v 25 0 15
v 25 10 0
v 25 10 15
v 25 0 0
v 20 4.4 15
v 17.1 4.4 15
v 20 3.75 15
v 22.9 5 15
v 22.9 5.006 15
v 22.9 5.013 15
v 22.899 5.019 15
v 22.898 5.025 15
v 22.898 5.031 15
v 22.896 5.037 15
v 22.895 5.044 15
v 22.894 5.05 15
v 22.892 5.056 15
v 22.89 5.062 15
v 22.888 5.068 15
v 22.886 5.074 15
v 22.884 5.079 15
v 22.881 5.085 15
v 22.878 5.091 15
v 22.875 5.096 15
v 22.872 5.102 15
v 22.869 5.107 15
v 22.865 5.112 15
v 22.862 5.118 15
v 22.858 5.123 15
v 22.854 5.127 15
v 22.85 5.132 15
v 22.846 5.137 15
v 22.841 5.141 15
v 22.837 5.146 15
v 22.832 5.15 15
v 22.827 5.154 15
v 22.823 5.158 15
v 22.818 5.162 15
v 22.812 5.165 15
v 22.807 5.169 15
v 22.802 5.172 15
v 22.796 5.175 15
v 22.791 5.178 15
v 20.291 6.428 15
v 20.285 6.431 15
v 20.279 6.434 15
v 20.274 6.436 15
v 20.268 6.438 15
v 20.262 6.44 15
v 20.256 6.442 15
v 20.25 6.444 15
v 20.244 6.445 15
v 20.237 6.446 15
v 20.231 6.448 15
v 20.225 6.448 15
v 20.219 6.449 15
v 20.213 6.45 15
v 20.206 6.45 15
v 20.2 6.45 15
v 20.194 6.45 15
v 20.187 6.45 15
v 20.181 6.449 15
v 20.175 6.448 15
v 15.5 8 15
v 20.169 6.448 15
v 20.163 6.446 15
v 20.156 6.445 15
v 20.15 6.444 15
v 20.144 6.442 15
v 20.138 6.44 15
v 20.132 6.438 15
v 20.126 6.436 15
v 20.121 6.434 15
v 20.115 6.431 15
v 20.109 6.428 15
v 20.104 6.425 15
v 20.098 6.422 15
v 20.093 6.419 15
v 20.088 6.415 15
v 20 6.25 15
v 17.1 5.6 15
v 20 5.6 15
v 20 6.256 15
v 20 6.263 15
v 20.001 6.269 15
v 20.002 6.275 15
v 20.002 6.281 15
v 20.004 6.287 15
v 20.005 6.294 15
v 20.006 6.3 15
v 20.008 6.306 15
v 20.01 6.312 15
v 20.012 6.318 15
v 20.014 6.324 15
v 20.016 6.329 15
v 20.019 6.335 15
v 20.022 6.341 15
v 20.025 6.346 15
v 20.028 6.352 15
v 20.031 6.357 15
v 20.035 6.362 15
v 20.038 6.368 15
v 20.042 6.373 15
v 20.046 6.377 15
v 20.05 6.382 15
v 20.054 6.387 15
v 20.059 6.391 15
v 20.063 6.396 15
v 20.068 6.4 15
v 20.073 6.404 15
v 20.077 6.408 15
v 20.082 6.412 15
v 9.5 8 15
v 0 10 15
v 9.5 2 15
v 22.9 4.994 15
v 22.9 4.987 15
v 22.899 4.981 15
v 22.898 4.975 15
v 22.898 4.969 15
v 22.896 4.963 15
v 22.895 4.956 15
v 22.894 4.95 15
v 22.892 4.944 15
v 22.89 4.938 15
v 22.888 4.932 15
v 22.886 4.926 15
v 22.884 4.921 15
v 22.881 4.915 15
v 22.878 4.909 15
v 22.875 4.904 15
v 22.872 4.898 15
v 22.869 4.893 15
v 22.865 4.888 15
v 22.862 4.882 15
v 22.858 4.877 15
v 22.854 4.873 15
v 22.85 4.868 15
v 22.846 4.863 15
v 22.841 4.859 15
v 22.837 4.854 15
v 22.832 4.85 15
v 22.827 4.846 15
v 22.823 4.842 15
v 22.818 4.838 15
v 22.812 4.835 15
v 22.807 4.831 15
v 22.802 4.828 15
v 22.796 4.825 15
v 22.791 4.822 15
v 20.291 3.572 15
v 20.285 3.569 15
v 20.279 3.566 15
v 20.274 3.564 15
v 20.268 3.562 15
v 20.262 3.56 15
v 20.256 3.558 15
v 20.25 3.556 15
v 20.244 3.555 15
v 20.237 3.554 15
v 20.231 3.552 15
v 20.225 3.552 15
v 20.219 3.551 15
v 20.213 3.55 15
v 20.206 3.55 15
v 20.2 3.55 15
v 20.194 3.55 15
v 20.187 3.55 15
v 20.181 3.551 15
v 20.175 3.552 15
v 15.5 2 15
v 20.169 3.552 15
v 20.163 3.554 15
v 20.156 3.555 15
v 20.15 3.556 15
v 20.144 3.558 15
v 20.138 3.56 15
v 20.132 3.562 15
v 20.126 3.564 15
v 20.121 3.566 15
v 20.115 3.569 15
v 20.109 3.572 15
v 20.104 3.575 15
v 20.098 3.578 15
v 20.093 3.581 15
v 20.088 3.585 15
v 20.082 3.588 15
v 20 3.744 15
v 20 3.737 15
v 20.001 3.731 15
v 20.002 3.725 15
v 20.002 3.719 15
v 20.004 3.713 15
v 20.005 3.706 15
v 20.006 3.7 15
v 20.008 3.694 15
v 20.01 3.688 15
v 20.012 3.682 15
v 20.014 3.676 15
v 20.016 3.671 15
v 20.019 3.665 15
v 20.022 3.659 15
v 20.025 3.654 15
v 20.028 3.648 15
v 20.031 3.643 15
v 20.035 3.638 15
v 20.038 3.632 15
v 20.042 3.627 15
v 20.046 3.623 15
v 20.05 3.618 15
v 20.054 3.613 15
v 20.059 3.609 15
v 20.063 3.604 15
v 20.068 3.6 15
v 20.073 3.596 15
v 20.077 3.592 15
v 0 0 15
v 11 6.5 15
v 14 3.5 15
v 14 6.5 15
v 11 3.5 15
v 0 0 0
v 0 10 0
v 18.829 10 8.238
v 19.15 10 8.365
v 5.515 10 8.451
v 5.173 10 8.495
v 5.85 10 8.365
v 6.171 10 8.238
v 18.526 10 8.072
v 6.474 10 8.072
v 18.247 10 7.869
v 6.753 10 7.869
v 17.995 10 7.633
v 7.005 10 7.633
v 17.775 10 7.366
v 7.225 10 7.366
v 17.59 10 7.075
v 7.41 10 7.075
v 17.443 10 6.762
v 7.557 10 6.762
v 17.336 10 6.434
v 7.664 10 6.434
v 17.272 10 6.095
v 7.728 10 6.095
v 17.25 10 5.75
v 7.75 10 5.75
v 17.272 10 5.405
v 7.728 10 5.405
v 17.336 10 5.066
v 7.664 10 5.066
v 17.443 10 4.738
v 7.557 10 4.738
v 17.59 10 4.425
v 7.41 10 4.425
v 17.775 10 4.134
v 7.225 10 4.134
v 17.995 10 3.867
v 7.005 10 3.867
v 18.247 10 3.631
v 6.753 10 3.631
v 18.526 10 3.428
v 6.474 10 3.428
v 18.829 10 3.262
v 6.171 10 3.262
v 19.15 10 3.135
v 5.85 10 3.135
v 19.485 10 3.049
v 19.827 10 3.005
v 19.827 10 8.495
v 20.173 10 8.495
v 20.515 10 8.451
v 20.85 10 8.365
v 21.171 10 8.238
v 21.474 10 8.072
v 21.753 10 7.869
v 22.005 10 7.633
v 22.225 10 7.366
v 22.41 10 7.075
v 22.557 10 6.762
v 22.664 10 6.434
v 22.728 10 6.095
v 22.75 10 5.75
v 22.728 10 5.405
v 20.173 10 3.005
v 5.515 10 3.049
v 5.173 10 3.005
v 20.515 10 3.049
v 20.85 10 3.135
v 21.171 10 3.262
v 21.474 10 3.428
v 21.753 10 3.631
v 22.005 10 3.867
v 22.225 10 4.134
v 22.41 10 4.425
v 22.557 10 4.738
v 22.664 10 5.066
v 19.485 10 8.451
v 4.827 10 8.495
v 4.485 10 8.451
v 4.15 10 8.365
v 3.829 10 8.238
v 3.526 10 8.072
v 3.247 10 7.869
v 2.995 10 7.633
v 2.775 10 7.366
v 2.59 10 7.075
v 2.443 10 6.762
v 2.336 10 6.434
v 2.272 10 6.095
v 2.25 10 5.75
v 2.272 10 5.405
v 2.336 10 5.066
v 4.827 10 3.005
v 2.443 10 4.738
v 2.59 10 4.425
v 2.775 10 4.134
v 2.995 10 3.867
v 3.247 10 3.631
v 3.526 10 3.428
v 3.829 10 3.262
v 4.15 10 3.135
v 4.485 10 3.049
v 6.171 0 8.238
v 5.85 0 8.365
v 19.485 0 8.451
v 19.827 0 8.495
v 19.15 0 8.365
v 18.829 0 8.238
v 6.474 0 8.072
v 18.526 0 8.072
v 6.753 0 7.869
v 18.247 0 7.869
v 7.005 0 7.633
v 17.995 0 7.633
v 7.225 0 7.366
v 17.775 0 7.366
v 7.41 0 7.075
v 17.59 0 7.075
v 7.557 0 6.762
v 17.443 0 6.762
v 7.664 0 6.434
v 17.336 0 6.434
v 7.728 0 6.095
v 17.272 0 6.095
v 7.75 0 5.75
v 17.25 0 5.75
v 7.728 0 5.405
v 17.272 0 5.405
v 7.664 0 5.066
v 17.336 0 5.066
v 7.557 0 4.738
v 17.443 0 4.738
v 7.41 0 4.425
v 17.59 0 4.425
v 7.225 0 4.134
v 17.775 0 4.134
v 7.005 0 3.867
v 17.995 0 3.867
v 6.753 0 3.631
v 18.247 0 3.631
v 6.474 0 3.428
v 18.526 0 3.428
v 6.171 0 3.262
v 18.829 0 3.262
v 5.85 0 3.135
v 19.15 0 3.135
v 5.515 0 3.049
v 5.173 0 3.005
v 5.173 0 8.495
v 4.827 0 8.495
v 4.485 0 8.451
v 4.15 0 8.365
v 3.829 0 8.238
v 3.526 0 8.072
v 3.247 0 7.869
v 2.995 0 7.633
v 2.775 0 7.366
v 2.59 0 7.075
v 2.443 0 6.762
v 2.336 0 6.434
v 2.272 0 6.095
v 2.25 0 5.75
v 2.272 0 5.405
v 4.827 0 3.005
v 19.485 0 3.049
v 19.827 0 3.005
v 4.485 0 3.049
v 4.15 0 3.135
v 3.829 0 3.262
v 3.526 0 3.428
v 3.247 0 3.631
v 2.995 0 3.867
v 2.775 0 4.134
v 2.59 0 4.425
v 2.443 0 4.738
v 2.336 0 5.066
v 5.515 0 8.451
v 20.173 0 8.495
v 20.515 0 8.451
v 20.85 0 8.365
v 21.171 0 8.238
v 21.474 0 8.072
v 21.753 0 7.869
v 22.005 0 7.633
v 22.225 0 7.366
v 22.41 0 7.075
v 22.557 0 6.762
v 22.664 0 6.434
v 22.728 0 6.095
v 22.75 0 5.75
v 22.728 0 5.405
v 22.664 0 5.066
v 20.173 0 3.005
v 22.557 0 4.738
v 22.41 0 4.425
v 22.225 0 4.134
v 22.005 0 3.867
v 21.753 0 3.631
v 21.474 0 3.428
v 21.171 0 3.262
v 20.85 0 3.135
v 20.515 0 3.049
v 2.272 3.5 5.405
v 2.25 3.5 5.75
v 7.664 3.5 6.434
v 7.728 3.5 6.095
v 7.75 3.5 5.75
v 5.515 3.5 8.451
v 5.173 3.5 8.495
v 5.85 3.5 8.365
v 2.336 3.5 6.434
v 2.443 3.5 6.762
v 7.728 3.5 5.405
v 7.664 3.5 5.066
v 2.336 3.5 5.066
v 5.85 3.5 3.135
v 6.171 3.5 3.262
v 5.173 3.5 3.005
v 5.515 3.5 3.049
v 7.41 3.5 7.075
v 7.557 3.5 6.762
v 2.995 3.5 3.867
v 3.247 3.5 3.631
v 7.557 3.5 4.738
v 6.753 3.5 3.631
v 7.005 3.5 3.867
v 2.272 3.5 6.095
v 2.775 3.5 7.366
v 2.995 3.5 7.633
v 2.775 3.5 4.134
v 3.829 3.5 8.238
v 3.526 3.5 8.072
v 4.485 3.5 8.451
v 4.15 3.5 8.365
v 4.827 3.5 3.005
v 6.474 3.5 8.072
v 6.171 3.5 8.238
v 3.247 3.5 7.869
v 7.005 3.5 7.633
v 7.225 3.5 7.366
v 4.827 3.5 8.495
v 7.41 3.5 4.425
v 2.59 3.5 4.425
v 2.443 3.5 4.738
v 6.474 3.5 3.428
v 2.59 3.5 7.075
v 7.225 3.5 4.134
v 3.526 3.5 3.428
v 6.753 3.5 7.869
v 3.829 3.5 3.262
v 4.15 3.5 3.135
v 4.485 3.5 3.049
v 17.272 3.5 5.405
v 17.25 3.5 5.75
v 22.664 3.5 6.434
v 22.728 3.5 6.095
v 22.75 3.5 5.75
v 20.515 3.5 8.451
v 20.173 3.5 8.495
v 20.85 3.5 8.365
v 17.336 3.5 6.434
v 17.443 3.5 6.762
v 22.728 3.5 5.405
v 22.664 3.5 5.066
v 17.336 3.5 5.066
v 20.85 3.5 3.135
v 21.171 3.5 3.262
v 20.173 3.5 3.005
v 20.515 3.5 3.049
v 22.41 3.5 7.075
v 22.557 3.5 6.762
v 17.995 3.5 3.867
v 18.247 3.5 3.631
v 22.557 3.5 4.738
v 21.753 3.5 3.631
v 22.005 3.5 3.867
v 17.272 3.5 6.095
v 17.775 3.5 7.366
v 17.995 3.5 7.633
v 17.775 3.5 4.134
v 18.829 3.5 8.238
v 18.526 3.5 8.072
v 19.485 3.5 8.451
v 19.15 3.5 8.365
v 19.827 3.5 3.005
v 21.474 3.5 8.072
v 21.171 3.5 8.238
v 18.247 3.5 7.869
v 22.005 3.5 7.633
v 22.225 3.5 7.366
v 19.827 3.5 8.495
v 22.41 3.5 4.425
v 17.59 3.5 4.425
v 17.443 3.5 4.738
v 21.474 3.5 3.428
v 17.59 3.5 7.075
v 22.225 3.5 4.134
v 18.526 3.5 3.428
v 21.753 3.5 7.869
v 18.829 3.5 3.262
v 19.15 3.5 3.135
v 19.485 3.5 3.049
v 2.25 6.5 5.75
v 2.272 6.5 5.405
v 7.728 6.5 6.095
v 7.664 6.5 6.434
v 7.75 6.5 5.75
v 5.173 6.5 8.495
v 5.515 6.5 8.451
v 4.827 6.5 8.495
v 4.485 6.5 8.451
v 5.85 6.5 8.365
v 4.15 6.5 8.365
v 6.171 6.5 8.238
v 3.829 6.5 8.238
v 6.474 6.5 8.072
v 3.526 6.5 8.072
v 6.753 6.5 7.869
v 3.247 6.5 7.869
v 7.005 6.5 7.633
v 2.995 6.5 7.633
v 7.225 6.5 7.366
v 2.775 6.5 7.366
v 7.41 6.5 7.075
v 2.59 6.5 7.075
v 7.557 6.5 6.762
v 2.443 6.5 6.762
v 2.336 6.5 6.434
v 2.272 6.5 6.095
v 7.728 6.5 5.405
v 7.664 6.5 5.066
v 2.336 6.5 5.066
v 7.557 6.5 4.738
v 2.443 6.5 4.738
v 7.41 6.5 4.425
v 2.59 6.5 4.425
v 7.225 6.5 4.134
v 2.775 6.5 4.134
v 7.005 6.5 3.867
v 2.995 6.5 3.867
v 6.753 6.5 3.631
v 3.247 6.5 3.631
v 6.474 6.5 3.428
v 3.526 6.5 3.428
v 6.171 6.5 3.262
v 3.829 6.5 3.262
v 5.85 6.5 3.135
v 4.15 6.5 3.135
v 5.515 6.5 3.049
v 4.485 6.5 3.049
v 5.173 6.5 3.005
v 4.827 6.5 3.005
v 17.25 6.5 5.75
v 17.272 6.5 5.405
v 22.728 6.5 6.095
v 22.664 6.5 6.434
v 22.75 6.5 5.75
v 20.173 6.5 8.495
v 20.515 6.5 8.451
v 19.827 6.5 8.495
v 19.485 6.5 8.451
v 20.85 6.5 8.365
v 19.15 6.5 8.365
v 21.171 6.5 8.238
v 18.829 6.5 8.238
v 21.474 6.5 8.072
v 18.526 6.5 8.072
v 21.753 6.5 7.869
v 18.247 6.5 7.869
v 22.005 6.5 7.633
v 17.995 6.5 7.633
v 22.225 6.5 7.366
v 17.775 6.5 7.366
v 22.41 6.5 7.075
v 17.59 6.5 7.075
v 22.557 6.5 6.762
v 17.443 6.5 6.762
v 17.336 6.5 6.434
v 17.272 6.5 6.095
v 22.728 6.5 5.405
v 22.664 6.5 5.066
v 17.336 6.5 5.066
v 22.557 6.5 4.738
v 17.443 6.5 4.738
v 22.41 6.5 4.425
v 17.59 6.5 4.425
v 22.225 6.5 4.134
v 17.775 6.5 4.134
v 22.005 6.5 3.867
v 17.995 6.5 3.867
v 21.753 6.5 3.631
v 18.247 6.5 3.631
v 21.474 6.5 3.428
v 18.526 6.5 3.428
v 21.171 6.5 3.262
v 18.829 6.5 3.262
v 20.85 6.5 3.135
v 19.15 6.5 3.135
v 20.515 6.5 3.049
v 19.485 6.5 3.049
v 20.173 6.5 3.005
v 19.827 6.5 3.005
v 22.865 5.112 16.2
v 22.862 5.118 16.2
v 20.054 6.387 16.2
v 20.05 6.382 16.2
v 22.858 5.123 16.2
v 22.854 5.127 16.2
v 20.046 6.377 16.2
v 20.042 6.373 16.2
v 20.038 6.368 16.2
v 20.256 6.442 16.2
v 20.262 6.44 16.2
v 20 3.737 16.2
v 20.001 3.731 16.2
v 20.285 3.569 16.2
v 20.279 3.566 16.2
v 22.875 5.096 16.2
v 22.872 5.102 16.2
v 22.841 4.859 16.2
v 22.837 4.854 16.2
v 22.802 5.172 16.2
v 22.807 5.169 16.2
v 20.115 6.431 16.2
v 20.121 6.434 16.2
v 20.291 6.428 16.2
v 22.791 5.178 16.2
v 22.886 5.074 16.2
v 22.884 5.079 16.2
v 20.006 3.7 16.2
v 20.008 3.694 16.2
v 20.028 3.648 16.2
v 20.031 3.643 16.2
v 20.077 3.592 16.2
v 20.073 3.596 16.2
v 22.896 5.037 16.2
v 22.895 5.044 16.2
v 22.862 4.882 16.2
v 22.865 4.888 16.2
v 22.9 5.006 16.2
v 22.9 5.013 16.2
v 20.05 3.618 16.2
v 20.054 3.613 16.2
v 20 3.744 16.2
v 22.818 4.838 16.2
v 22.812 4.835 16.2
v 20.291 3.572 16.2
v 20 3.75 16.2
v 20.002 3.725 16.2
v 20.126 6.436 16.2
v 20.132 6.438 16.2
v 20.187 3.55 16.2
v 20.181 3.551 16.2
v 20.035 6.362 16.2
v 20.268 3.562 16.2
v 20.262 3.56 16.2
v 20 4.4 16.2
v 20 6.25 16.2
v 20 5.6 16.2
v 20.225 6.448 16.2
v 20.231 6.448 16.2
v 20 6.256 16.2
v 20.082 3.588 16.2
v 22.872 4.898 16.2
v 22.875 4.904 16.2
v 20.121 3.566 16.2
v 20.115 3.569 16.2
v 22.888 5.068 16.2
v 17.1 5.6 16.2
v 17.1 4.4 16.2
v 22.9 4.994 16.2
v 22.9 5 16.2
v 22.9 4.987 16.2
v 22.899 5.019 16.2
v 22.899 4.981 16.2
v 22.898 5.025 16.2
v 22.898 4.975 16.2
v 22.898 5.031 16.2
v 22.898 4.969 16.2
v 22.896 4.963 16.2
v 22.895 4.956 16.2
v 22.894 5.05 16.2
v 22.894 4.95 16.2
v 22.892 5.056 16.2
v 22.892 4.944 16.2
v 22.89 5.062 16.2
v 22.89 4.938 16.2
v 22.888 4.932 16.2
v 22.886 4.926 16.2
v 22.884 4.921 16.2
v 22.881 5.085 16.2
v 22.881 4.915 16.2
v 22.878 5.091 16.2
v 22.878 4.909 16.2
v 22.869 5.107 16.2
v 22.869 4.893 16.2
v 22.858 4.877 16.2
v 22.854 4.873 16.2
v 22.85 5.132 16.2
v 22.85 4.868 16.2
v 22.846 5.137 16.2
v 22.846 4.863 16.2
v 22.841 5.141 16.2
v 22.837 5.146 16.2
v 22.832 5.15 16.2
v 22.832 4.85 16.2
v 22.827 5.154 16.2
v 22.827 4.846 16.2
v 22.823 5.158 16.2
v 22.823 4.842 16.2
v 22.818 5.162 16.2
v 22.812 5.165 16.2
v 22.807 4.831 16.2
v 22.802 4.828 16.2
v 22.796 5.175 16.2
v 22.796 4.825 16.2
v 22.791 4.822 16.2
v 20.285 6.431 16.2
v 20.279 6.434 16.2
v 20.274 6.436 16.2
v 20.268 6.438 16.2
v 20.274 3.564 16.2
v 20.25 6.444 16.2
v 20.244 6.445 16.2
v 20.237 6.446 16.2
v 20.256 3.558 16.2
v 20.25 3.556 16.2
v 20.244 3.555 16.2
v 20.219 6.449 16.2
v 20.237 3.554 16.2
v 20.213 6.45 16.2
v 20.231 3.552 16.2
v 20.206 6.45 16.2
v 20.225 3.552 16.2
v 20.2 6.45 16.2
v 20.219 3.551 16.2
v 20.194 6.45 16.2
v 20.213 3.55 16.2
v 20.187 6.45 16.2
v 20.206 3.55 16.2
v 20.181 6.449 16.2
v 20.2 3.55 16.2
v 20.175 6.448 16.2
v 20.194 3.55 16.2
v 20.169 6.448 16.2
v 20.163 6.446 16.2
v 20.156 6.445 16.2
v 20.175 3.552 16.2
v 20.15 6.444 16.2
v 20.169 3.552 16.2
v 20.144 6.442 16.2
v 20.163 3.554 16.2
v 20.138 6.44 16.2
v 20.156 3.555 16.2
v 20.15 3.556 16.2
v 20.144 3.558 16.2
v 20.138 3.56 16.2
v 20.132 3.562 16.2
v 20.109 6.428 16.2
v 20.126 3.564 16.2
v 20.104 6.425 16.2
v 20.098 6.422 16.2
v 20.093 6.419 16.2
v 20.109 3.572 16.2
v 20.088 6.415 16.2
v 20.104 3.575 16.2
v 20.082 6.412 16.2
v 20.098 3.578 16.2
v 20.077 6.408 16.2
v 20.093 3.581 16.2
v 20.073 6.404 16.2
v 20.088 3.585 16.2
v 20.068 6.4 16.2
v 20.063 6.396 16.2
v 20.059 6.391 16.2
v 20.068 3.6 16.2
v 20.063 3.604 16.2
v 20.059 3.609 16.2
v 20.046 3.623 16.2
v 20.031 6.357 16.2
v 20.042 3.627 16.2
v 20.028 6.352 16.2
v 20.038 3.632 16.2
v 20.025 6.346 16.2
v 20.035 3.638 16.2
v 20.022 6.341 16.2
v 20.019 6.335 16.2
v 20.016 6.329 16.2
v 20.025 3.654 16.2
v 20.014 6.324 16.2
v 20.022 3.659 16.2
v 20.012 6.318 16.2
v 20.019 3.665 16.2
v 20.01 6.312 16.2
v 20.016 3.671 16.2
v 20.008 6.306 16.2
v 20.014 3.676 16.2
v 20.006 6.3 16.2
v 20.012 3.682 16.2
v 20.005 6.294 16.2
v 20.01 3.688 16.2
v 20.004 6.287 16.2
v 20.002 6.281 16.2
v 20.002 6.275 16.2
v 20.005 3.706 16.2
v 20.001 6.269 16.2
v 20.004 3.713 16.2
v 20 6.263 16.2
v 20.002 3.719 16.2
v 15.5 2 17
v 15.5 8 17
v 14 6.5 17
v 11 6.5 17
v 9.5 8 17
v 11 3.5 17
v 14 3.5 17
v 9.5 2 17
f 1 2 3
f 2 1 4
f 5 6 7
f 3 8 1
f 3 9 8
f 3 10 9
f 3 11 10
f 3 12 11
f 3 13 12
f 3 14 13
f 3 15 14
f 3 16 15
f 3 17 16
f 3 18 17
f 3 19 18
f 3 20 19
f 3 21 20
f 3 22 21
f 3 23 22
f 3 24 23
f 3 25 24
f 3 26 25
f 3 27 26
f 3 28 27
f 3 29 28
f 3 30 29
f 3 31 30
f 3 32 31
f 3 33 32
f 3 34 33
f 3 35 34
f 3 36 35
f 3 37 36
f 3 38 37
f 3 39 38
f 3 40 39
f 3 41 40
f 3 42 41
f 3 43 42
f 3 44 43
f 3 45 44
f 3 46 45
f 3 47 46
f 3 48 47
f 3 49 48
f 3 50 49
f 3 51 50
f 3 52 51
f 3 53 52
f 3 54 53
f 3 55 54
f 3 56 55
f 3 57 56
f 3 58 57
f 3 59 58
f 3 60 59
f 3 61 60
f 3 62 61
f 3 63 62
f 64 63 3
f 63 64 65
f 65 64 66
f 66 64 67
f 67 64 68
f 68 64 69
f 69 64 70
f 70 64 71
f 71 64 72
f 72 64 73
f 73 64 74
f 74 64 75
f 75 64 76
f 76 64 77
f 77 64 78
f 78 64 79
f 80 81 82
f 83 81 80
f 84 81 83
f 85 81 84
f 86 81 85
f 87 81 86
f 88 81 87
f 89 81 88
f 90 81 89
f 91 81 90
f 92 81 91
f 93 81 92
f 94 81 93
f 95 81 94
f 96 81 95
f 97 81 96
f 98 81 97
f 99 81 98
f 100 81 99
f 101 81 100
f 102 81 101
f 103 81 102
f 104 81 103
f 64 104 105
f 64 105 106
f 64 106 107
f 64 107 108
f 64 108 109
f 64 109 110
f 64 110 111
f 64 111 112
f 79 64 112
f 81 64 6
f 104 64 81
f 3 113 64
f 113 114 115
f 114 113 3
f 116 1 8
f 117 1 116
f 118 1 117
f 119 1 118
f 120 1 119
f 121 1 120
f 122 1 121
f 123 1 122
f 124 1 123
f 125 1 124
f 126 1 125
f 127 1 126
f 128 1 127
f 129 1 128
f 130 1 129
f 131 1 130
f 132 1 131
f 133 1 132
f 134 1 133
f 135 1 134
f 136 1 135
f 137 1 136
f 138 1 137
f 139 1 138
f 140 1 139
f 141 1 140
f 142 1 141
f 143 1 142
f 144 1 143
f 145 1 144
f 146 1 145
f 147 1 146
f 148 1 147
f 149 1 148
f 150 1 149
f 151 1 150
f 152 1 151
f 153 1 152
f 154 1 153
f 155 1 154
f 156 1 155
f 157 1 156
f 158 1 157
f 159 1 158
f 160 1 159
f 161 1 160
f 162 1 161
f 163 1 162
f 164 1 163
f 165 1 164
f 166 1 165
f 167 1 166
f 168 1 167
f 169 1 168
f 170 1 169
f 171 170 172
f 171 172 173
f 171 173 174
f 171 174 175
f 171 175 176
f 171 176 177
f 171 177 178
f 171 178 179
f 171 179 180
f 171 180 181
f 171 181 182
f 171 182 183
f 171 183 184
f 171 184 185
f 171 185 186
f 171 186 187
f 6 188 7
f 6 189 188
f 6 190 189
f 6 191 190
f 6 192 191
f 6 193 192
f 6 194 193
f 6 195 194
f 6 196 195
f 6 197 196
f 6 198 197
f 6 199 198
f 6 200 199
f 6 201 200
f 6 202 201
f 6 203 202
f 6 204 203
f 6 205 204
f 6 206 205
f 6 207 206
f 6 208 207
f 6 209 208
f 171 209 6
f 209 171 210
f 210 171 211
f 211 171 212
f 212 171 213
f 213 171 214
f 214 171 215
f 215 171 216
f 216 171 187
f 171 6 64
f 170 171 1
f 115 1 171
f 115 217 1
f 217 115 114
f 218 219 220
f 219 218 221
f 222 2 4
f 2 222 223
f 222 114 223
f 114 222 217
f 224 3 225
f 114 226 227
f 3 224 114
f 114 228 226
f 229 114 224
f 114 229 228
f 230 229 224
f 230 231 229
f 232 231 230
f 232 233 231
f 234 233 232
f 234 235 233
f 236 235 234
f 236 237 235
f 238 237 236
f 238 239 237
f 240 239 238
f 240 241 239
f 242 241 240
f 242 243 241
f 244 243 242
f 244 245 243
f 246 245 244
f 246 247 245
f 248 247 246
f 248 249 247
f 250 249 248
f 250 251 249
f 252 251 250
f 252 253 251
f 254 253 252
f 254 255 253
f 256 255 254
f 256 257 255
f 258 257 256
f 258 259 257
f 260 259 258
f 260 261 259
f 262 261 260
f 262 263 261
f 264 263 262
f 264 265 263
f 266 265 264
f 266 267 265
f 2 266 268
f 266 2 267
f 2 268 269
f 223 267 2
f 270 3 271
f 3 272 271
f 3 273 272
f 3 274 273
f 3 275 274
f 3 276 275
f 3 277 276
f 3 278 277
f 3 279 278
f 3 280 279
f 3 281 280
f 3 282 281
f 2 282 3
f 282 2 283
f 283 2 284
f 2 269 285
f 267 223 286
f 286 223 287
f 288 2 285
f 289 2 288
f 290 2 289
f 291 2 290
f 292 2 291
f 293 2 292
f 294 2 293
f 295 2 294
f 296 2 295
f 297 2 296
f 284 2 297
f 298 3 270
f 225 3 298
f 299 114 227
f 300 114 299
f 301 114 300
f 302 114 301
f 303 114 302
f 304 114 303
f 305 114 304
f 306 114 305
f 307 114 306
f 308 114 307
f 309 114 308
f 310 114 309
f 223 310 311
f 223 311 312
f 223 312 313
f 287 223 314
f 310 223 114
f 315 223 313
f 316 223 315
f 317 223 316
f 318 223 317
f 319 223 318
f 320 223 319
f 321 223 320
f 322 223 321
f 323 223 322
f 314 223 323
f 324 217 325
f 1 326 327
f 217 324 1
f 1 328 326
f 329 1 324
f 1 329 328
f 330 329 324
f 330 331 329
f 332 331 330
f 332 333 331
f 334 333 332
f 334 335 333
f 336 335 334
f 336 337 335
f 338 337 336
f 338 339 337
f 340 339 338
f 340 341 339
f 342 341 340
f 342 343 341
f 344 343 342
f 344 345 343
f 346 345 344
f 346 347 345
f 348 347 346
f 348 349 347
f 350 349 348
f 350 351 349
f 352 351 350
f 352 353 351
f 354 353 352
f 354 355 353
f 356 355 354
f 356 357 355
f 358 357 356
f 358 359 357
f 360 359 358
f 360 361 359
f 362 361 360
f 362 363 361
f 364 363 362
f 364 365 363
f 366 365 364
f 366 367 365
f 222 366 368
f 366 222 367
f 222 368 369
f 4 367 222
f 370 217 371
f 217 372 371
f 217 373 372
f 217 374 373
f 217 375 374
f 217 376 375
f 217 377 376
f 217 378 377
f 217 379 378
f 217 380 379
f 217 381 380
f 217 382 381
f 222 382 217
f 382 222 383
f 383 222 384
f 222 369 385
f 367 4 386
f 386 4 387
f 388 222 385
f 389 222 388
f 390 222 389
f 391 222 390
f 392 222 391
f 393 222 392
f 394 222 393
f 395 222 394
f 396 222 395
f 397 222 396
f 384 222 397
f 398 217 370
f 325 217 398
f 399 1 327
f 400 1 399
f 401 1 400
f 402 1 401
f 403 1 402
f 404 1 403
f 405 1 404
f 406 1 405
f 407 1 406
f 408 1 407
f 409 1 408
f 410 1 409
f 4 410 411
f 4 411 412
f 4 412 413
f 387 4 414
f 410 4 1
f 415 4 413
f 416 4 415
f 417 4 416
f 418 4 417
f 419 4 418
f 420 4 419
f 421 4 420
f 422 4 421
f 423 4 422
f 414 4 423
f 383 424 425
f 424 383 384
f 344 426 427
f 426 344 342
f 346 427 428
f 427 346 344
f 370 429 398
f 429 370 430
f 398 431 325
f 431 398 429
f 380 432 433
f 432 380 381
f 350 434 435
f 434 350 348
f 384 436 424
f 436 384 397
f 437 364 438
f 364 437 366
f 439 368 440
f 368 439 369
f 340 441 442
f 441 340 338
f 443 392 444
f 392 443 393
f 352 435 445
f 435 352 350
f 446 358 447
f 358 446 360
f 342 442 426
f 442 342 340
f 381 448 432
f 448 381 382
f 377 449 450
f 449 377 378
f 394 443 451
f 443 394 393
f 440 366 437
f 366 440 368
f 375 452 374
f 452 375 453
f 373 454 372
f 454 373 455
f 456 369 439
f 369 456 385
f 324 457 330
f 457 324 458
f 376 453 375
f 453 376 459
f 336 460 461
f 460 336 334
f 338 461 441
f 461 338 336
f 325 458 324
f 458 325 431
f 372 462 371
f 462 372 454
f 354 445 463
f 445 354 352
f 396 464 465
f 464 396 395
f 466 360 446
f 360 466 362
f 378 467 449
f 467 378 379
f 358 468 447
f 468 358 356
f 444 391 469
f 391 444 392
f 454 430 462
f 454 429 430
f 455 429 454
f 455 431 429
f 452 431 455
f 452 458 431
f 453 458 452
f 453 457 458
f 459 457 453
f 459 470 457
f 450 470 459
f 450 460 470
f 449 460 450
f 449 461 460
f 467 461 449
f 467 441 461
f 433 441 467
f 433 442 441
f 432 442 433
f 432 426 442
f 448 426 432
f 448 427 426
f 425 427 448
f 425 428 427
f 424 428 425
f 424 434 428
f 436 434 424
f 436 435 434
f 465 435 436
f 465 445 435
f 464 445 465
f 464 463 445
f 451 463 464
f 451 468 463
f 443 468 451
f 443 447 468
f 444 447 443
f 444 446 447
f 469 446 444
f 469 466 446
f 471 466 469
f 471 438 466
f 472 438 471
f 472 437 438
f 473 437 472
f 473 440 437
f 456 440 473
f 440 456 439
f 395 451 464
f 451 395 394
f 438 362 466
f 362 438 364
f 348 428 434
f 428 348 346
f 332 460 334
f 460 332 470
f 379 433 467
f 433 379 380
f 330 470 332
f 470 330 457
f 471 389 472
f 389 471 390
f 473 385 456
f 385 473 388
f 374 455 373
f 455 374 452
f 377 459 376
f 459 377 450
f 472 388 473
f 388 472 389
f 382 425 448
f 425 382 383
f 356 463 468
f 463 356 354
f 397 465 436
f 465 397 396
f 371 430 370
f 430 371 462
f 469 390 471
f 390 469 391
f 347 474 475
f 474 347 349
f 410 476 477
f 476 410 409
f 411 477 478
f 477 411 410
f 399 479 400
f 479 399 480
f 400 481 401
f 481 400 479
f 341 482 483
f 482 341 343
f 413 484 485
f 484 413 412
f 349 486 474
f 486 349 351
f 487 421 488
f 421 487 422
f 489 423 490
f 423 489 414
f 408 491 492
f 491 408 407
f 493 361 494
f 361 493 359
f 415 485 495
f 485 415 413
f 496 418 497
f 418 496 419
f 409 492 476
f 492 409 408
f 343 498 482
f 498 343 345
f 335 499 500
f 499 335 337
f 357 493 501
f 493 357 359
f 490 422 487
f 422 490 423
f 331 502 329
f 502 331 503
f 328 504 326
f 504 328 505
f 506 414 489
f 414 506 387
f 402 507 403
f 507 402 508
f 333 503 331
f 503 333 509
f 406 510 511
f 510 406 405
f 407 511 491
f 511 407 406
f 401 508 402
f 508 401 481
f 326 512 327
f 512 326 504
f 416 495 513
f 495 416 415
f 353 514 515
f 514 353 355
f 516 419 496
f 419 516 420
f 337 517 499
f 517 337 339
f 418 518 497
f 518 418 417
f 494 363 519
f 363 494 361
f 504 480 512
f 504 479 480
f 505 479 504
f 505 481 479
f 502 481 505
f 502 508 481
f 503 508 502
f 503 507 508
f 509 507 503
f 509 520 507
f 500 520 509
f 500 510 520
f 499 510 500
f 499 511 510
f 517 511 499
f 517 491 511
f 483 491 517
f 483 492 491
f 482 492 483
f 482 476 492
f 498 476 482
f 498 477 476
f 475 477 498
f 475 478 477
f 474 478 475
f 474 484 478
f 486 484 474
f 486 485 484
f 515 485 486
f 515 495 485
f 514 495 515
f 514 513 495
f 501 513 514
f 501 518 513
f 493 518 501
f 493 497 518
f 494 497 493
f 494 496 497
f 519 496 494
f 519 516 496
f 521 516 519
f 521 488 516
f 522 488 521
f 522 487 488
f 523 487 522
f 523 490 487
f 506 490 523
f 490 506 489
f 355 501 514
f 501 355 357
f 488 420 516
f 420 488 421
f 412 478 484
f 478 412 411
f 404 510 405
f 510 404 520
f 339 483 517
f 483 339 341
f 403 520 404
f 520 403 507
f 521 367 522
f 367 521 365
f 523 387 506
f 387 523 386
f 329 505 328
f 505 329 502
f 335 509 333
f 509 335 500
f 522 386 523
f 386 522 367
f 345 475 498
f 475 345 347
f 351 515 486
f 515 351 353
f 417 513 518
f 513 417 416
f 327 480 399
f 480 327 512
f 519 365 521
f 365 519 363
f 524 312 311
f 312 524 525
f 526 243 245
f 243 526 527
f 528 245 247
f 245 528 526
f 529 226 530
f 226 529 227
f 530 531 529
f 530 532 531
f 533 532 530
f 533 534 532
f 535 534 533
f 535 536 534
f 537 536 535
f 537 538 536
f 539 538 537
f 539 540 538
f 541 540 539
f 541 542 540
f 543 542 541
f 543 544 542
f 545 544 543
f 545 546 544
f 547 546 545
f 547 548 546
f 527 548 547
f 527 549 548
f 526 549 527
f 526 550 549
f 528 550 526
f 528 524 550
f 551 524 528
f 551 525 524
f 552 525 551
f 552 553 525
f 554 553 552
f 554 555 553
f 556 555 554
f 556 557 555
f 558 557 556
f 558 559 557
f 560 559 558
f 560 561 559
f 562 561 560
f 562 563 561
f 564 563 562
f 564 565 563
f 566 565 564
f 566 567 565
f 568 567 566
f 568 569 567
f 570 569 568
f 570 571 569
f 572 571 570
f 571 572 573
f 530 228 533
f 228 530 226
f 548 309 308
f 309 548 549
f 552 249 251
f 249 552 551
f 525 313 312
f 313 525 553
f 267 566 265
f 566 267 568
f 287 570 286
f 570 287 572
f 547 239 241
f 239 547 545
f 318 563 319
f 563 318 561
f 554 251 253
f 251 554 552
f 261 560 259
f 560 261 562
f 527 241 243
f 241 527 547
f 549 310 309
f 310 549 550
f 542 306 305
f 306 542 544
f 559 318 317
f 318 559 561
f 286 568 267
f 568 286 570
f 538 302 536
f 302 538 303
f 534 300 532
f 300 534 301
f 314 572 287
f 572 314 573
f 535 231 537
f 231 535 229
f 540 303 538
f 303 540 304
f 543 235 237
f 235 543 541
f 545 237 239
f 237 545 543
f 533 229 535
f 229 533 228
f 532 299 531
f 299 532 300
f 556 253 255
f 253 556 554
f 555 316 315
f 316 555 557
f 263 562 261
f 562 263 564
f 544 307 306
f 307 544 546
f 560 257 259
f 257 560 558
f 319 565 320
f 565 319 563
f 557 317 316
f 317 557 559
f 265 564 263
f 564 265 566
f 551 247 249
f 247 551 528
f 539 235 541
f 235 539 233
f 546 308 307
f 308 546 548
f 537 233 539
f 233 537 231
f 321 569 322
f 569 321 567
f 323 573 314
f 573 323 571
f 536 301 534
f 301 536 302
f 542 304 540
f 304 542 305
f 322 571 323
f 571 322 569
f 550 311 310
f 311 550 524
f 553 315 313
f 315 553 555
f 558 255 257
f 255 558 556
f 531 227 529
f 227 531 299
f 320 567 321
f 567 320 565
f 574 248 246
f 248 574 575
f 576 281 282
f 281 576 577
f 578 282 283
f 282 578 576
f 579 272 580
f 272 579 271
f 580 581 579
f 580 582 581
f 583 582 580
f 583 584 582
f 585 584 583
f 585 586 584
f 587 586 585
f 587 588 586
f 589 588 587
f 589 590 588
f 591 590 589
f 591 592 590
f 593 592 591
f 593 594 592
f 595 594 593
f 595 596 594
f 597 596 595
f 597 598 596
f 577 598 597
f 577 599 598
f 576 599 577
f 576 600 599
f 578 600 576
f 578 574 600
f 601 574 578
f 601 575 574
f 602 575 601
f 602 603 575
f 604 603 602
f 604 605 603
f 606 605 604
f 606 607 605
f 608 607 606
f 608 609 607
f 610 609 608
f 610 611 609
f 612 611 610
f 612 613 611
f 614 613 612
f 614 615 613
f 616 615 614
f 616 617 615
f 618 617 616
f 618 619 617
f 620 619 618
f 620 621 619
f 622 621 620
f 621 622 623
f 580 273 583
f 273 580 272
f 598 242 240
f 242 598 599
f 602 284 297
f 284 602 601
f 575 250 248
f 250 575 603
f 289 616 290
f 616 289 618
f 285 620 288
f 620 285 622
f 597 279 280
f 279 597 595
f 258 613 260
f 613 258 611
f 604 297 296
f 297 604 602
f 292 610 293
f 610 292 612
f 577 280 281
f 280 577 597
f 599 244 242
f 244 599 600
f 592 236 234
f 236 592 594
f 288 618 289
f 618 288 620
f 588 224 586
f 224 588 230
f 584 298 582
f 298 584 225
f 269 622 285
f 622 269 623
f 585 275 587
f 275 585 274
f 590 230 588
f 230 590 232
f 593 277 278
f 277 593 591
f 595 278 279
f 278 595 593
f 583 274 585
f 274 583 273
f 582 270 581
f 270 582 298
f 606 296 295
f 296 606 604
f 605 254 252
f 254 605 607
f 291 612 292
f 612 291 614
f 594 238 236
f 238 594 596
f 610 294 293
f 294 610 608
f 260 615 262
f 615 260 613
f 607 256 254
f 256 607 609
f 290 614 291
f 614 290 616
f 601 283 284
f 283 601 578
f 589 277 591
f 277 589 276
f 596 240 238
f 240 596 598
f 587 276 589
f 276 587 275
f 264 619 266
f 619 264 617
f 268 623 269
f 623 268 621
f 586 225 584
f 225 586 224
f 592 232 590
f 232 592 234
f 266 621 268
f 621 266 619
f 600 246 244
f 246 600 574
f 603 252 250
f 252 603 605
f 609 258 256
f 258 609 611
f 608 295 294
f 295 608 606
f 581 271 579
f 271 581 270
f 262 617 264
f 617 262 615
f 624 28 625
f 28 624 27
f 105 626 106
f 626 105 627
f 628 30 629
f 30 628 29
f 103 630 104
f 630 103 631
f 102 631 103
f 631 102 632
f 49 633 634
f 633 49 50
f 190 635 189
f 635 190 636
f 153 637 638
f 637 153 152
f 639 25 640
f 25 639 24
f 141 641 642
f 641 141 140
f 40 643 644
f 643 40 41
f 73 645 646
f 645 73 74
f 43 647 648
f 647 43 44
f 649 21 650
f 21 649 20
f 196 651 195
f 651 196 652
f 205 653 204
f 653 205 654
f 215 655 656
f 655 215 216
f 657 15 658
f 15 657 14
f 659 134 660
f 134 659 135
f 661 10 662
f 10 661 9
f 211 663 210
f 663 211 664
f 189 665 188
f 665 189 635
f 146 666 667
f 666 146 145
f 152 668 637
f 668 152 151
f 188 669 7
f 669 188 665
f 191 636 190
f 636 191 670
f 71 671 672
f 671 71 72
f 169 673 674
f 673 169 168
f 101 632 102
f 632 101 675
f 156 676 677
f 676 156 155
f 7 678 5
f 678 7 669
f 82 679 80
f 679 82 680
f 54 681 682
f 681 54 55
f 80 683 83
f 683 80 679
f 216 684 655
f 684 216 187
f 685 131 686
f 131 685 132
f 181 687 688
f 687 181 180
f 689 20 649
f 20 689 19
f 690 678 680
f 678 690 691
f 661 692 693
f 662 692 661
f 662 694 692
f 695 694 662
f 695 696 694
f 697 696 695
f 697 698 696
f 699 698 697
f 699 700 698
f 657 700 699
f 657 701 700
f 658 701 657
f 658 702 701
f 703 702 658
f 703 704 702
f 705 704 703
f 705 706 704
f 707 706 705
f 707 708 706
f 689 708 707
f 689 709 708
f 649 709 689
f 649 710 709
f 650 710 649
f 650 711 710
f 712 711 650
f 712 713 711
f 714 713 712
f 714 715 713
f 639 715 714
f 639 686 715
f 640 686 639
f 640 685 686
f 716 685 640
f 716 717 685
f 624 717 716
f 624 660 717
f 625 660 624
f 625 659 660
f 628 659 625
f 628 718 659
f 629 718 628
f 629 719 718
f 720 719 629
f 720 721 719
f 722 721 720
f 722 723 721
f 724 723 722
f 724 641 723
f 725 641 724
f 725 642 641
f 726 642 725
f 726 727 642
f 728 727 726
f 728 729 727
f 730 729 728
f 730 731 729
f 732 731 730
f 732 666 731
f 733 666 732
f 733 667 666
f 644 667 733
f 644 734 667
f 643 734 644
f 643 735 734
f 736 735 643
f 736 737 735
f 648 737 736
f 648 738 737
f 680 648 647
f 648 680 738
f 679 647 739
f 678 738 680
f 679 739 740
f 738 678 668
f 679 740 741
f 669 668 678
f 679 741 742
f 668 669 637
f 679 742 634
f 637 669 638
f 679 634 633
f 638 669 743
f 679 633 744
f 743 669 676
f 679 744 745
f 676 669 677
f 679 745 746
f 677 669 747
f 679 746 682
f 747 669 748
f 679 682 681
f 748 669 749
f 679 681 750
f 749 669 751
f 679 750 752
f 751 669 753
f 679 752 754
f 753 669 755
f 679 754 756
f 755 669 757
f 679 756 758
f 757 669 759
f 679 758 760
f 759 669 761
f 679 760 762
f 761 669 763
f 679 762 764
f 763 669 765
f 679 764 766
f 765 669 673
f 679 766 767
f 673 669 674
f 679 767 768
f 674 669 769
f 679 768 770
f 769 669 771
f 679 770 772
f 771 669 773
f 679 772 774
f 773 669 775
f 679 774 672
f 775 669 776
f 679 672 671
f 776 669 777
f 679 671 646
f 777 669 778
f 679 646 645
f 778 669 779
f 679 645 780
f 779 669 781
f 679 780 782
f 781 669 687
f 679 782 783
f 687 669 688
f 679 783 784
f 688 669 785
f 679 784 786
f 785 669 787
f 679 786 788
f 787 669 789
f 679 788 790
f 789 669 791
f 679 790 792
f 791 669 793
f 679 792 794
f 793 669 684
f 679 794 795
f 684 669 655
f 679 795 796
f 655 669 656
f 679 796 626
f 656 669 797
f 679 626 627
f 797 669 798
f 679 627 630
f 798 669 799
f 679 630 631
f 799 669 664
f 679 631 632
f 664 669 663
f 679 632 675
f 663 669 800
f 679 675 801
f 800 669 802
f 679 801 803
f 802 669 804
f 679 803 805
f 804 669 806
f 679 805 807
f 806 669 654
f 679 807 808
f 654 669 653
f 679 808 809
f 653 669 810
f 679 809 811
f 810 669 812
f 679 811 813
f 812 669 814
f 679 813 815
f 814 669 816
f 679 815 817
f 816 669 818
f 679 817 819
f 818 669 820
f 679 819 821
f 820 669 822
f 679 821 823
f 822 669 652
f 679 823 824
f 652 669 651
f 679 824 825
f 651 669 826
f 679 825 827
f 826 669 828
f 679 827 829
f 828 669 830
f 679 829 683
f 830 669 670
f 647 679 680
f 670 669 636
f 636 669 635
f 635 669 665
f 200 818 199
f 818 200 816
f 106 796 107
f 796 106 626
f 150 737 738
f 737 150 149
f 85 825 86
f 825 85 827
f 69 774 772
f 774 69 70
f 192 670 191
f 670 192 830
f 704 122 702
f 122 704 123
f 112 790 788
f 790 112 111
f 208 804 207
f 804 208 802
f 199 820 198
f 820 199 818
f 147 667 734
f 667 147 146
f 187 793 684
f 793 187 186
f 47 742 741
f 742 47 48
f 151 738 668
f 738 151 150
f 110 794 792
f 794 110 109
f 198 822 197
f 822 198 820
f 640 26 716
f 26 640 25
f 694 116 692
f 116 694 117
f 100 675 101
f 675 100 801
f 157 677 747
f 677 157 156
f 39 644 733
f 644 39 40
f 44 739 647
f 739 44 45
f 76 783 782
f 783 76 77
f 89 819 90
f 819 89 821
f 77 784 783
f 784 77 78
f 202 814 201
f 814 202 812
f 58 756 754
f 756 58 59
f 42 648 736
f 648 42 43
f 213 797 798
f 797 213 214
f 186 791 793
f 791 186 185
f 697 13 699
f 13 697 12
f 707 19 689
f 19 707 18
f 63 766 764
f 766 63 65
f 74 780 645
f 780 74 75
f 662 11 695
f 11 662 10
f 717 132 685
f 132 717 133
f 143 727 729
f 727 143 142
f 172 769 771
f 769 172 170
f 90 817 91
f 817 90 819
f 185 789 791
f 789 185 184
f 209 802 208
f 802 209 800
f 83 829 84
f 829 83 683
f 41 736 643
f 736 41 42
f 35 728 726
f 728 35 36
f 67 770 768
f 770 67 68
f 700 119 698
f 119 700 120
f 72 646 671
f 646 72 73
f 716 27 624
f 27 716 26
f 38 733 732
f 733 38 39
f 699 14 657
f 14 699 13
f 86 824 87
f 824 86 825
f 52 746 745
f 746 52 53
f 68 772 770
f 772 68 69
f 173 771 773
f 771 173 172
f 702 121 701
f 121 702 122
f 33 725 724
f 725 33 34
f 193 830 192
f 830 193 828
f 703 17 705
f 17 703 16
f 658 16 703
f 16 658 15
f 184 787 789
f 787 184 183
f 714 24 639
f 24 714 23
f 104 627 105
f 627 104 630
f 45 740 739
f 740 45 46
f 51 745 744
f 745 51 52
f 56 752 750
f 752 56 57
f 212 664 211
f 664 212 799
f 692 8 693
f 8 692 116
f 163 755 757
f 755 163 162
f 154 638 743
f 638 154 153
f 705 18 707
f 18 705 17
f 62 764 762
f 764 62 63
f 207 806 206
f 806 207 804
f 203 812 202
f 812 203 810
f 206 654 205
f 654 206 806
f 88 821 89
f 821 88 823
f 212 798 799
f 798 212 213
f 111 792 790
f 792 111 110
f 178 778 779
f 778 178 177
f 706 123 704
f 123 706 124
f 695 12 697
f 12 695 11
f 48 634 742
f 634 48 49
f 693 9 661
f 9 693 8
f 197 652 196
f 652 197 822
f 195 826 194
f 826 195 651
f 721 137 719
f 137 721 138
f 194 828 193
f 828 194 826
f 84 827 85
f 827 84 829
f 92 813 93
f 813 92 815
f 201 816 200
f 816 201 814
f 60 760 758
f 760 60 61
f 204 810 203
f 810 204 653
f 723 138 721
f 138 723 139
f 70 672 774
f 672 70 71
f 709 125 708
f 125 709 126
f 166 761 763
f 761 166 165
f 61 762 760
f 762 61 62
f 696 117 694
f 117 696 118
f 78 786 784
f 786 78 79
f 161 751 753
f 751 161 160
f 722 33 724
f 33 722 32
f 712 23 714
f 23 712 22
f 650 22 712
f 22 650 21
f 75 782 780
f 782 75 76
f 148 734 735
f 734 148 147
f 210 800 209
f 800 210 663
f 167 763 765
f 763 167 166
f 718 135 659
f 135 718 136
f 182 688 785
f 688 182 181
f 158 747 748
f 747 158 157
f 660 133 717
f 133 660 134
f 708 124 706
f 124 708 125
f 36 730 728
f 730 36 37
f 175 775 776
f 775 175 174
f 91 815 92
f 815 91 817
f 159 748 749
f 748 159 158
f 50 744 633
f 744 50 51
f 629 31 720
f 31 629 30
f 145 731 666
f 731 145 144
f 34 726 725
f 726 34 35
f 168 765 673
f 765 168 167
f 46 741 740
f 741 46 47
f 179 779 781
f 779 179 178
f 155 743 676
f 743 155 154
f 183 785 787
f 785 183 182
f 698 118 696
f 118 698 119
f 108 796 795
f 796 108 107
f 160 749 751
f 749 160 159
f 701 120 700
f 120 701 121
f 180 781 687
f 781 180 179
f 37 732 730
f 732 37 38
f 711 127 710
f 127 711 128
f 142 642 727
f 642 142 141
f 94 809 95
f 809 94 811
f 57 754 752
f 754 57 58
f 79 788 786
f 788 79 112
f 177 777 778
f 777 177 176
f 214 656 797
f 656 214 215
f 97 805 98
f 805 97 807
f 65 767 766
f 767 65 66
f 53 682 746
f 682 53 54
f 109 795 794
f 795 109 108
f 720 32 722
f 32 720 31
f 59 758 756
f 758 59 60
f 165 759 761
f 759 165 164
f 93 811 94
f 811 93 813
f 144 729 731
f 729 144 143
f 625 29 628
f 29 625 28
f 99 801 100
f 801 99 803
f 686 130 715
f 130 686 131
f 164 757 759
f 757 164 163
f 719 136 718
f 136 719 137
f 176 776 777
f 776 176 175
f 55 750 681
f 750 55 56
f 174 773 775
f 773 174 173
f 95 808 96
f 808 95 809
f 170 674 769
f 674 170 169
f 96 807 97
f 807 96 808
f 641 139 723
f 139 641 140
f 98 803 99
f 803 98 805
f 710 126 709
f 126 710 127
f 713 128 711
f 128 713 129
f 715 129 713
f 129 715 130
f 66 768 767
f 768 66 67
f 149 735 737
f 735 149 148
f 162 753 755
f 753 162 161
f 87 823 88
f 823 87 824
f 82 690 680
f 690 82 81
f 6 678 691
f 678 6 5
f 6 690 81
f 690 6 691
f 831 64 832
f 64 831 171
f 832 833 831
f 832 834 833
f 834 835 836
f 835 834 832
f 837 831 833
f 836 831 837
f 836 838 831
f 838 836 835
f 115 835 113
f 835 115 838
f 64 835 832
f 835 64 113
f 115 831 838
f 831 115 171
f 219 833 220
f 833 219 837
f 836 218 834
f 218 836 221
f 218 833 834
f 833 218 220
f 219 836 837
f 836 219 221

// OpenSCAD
// file: locking_pin.scad
// Copyright 2024 Martin Scheidt (Attribution 4.0 International, CC-BY 4.0)
//
// You are free to copy and redistribute the material in any medium or format.
// You are free to remix, transform, and build upon the material for any purpose, even commercially.
// You must give appropriate credit, provide a link to the license, and indicate if changes were made.
// You may not apply legal terms or technological measures that legally restrict others from doing anything the license permits.
// No warranties are given.

include<./specification_of_components.scad>
   
$fn = 50;// number of fragments

locking_pin();

module grip_ring(){
    height = 1.2;
    depth = 1.2;
    difference(){
        cylinder(h=height, d=locker_width);
        cylinder(h=height, d=locker_width-depth);
    }
}
module locking_pin(){
    difference(){
    minkowski() {
        difference(){
            cylinder(d = locker_width-2*rounding, h = locker_height-2*rounding);
            rotate([0,0,90]) translate([(-locker_width/2),(-(lever_thickness_switch+move_tolerance)/2-rounding),(locker_height-lever_height)])cube([(locker_width),(lever_thickness_switch+2*rounding+move_tolerance),(lever_height+2*rounding)]);
        };
        sphere(rounding);
    }
    translate([0,0,1]) grip_ring();
    }
}

echo("lever_height+2*rounding: ",lever_height+2*rounding);
echo("z_pos_axis-handle_height/2+move_tolerance+2*rounding: ", z_pos_axis-handle_height/2+move_tolerance+2*rounding);

//signal_locker();
// file: basis_component-roundedBox.scad
// Copyright 2024 Martin Scheidt (Attribution 4.0 International, CC-BY 4.0)
//
// You are free to copy and redistribute the material in any medium or format.
// You are free to remix, transform, and build upon the material for any purpose, even commercially.
// You must give appropriate credit, provide a link to the license, and indicate if changes were made.
// You may not apply legal terms or technological measures that legally restrict others from doing anything the license permits.
// No warranties are given.

include<./specification_of_components.scad>

$fn = 200;

curvedBox();

module magnet_hole(){
    cylinder(h=magnet_thickness+move_tolerance, d=magnet_diameter+move_tolerance);
}

module curvedBox(){
    module box(){
        difference(){
            cube([body_width, body_depth, body_height]);
        }
    }
    module round_edge(){
        cylinder(h=body_height, r=track_arc_inner_radius);
    }
    difference(){
        intersection(){
            intersection(){
                translate([0,0,0])box();
                translate([track_arc_inner_radius-sagitta,body_depth/2,0])round_edge();
            }
            intersection(){
                translate([0,0,0])box();
                translate([body_width-track_arc_inner_radius+sagitta,body_depth/2,0])round_edge();
            }
        }
        //magnet holes
        translate([0,body_depth/2 - magnet_distance_to_middle, magnet_z])rotate([0,90,0])magnet_hole();
        translate([0,body_depth/2 + magnet_distance_to_middle, magnet_z])rotate([0,90,0])magnet_hole();
        translate([body_width-magnet_thickness-0.5,body_depth/2 - magnet_distance_to_middle, magnet_z])rotate([0,90,0])magnet_hole();
        translate([body_width-magnet_thickness-0.5,body_depth/2 + magnet_distance_to_middle, magnet_z])rotate([0,90,0])magnet_hole();
        
    }
}
// main file
// Copyright 2024 Martin Scheidt (Attribution 4.0 International, CC-BY 4.0)
//
// You are free to copy and redistribute the material in any medium or format.
// You are free to remix, transform, and build upon the material for any purpose, even commercially.
// You must give appropriate credit, provide a link to the license, and indicate if changes were made.
// You may not apply legal terms or technological measures that legally restrict others from doing anything the license permits.
// No warranties are given.

include<./specification_of_components.scad>
use<./distant-main_signal.scad>

$fn = 50;

module magnet_hole(){
    cylinder(h=magnet_thickness+move_tolerance, d=magnet_diameter+move_tolerance);
}
module route_clearing_point(){
    union(){
        difference(){
            cylinder(h=engraving_height, d=cp_symbol_size);
            cylinder(h=engraving_height, d=cp_symbol_size-2*engraving_thickness);
        }   
    }
}

module block_clearing_point(){
    translate([0,0,engraving_height/2]) union(){    
        difference(){
            cube([cp_symbol_size,cp_symbol_size,engraving_height], center=true);
            cube([cp_symbol_size-2*engraving_thickness,cp_symbol_size-2*engraving_thickness,engraving_height], center=true);
        }
    }
}



module clearing_point(type){
    difference(){
        cube([zs_with,zs_depth,zs_height]);
        //Magnet holes
        translate([zs_with/2-magnet_distance_to_middle,magnet_thickness+move_tolerance,magnet_z]) rotate([90,0,0]) magnet_hole();
        translate([zs_with/2+magnet_distance_to_middle,magnet_thickness+move_tolerance,magnet_z]) rotate([90,0,0]) magnet_hole();
        translate([zs_with/2-magnet_distance_to_middle,zs_depth,magnet_z]) rotate([90,0,0]) magnet_hole();
        translate([zs_with/2+magnet_distance_to_middle,zs_depth,magnet_z]) rotate([90,0,0]) magnet_hole();
    }
    translate([zs_with*(4/5),(zs_depth-attach_arrow_depth)/2,zs_height]) rotate([0,0,90]) driving_direction_arrow();
    //symbols
    if(type == "rcp"){
            translate([zs_with/2,zs_depth/2,zs_height]) route_clearing_point();
    }
    if(type == "bcp"){
            translate([zs_with/2,zs_depth/2,zs_height]) block_clearing_point();
    }
}

clearing_point("bcp");
//route_clearing_point();
//block_clearing_point();
